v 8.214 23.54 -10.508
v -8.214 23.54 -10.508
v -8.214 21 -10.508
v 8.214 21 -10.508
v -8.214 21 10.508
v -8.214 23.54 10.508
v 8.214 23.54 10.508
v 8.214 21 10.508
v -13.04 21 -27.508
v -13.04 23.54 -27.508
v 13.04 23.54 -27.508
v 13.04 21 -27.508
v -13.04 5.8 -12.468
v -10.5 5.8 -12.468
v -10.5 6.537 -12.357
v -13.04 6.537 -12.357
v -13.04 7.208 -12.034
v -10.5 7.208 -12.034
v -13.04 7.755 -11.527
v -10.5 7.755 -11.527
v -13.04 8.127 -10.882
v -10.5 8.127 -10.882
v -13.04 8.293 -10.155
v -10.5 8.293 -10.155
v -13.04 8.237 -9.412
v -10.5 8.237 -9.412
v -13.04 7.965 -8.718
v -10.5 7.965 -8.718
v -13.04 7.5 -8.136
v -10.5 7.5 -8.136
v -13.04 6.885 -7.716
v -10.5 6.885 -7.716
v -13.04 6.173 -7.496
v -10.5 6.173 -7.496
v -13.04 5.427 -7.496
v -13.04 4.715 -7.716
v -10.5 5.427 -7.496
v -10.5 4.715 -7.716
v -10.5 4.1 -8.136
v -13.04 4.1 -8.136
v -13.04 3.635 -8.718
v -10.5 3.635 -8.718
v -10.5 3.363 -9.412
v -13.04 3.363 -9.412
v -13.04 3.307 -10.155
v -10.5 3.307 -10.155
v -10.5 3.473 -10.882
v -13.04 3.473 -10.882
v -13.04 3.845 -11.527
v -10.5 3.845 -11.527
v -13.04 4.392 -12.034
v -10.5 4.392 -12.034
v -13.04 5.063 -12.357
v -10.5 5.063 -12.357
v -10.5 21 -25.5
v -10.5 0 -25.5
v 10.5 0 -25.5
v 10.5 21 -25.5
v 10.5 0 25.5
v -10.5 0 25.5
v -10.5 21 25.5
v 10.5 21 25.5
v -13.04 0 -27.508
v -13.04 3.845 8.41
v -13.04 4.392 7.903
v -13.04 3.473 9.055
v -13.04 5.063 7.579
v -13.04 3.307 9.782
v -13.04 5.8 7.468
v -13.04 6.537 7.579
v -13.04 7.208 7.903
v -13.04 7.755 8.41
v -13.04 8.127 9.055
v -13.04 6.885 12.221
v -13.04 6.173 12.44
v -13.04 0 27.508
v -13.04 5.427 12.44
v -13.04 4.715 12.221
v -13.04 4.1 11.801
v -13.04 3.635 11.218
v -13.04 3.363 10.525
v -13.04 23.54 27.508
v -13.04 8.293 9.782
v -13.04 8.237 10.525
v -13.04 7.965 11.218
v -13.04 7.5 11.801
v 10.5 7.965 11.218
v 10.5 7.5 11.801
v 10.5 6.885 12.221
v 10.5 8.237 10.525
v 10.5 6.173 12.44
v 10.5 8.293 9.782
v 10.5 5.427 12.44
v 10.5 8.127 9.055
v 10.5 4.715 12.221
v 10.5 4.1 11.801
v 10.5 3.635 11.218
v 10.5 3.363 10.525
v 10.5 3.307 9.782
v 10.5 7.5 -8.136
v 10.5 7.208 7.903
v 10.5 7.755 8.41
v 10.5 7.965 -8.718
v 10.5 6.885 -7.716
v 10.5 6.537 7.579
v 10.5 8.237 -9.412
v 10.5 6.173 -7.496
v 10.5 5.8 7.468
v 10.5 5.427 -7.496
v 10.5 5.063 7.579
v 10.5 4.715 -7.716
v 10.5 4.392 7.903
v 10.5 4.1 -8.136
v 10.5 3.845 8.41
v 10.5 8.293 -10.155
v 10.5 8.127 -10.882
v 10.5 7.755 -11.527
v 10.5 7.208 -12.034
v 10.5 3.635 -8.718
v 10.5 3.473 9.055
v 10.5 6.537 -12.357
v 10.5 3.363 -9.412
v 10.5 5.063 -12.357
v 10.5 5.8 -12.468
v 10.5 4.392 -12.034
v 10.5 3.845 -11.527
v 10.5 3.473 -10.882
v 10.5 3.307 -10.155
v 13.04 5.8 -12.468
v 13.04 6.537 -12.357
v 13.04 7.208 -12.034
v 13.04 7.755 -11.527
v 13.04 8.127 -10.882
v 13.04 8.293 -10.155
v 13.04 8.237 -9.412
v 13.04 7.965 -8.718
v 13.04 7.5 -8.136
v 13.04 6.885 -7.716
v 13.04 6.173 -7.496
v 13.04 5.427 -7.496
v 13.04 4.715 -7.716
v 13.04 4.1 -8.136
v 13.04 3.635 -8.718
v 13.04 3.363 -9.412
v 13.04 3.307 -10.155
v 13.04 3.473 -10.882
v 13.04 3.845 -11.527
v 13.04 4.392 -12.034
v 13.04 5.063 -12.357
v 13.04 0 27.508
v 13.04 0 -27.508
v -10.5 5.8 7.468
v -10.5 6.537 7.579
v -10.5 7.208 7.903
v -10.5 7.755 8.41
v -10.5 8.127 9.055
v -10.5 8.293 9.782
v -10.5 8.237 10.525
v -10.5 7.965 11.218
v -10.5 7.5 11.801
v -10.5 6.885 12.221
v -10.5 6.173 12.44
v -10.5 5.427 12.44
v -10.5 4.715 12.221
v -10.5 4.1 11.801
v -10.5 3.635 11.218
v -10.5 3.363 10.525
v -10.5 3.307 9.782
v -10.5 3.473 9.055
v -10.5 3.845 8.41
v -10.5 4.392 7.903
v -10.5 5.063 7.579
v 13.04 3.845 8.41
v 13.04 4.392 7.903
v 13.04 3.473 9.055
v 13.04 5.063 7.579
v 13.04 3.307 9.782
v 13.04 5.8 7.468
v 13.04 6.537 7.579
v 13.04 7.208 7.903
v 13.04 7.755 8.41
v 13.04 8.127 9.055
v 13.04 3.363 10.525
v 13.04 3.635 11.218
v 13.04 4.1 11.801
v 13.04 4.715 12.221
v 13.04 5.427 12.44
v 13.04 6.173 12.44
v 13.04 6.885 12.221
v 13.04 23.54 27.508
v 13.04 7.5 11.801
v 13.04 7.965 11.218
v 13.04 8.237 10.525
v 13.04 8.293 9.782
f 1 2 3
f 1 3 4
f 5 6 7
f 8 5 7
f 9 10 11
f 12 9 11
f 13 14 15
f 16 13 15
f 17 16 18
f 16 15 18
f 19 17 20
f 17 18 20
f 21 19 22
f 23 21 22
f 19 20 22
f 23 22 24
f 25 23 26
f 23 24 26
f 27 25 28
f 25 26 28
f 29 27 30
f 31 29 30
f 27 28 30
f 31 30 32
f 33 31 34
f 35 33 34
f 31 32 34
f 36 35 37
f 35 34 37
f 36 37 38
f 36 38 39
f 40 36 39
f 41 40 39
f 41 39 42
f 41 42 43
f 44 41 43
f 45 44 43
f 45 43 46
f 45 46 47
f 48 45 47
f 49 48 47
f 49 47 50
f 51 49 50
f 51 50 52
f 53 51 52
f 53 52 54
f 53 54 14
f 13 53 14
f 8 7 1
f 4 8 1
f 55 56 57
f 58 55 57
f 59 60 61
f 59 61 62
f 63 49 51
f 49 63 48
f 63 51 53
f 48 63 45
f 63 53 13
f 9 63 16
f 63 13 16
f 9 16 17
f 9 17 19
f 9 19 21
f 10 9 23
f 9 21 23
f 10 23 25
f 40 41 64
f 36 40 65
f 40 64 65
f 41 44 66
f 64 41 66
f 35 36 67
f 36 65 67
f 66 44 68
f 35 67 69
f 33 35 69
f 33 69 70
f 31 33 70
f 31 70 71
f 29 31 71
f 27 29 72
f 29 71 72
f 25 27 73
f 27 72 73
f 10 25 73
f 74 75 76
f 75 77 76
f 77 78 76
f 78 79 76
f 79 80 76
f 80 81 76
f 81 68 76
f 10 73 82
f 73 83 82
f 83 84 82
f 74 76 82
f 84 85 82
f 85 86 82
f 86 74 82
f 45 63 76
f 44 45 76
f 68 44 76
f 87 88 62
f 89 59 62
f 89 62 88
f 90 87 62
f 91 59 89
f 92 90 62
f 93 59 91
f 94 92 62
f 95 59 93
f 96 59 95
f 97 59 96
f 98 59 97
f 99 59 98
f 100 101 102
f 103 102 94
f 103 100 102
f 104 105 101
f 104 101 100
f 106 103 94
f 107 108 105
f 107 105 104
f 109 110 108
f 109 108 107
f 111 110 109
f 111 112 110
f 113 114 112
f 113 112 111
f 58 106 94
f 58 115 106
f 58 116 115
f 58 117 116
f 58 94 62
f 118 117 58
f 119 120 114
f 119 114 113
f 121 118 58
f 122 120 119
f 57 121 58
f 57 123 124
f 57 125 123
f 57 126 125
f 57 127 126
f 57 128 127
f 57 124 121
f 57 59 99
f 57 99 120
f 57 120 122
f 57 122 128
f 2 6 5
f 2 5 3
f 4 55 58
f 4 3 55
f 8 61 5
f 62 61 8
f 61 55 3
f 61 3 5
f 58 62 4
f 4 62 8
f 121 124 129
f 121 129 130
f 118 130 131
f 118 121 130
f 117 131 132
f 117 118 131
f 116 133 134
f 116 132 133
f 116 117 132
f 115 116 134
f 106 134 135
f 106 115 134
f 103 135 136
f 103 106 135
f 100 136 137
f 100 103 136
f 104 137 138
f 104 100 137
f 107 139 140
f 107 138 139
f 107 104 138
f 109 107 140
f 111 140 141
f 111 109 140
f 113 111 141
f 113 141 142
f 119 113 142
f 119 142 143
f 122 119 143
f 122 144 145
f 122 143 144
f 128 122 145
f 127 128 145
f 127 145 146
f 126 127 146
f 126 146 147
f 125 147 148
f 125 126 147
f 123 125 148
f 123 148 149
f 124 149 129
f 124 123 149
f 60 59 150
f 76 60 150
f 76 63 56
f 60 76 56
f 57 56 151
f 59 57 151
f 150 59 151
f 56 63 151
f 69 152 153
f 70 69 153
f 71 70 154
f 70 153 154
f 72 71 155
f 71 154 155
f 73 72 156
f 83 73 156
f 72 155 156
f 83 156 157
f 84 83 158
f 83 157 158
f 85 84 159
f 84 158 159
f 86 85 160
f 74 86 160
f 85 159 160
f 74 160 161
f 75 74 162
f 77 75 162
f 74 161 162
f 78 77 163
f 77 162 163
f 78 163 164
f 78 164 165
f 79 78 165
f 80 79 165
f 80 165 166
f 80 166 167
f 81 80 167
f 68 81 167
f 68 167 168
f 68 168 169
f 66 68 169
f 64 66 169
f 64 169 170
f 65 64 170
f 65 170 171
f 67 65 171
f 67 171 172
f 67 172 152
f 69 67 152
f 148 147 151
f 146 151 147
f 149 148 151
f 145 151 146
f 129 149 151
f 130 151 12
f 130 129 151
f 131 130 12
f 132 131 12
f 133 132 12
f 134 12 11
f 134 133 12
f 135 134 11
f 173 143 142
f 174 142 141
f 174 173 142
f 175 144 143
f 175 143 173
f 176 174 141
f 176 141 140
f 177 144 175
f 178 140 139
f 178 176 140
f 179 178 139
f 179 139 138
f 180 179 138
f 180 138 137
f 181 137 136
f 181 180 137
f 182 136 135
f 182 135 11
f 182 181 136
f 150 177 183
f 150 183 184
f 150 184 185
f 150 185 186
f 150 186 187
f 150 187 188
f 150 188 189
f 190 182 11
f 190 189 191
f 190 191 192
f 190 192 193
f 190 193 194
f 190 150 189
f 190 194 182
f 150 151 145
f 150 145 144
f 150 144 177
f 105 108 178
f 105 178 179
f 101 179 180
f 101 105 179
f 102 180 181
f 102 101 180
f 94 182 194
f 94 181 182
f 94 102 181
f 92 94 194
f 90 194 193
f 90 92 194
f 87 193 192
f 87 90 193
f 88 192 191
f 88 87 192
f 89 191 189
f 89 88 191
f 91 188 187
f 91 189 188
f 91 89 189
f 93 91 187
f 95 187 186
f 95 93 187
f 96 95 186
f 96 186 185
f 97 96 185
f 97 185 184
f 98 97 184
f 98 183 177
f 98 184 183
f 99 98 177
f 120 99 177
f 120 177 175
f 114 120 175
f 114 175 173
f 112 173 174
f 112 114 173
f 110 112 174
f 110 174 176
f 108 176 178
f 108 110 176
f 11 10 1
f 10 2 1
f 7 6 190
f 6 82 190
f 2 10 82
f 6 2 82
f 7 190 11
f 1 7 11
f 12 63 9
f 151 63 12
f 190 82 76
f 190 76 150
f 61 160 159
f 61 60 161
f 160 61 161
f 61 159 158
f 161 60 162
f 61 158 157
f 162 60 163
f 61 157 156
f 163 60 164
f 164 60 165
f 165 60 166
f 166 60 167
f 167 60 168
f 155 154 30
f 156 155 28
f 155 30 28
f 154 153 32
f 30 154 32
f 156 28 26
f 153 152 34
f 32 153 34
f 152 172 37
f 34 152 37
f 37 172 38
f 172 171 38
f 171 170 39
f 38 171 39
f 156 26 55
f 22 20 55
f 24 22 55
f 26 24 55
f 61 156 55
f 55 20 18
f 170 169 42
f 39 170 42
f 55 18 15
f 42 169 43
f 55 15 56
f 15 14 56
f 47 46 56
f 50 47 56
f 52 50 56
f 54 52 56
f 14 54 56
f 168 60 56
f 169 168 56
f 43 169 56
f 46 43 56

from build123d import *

# Parameters (mm, degrees)
SKETCH1_W                      = 26.08
SKETCH1_H                      = 55.016744186
SKETCH1_W_2                    = 21
SKETCH1_H_2                    = 51
BOSS_EXTRUDE1_DEPTH            = 21
SKETCH3_W                      = 26.08
SKETCH3_H                      = 2.54
BOSS_EXTRUDE2_DEPTH            = 55.016744
CUT_EXTRUDE1_REACH             = 40.482
SKETCH4_W                      = 16.428
SKETCH4_H                      = 21.016744186
CUT_EXTRUDE2_REACH             = 40.482
SKETCH5_R                      = 2.5
CUT_EXTRUDE2_DIRECTION_2_REACH = 40.482


with BuildPart() as part:
    # Sketch1 → Boss-Extrude1 (new body)
    with BuildSketch(Plane(origin=(0, 0, 0), x_dir=(1, 0, 0), z_dir=(0, 1, 0))):
        Rectangle(SKETCH1_W, SKETCH1_H)
        Rectangle(SKETCH1_W_2, SKETCH1_H_2, mode=Mode.SUBTRACT)
    extrude(amount=BOSS_EXTRUDE1_DEPTH)

    # Sketch3 → Boss-Extrude2 (add, through all)
    with BuildSketch(Plane.XY.offset(27.508372093)):
        with Locations((0, 22.27)):
            Rectangle(SKETCH3_W, SKETCH3_H)
    extrude(amount=-BOSS_EXTRUDE2_DEPTH)

    # Sketch4 → Cut-Extrude1 (cut, up to next)
    with BuildSketch(Plane(origin=(0, 23.54, 0), x_dir=(1, 0, 0), z_dir=(0, 1, 0)), mode=Mode.PRIVATE) as cut_extrude1_sk1:
        Rectangle(SKETCH4_W, SKETCH4_H)
    cut_extrude1_tool1 = extrude(cut_extrude1_sk1.sketch, amount=-CUT_EXTRUDE1_REACH, mode=Mode.PRIVATE) & part.part
    add(cut_extrude1_tool1.solids().sort_by_distance((0, 23.54, 0))[0], mode=Mode.SUBTRACT)

    # Sketch5 → Cut-Extrude2 (cut, up to next)
    with BuildSketch(Plane(origin=(0, 0, 0), x_dir=(0, 0, -1), z_dir=(1, 0, 0)), mode=Mode.PRIVATE) as cut_extrude2_sk1:
        with Locations((-9.968372093, 5.8)):
            Circle(SKETCH5_R)
    cut_extrude2_tool1 = extrude(cut_extrude2_sk1.sketch, amount=-CUT_EXTRUDE2_REACH, mode=Mode.PRIVATE) & part.part
    # Sketch5 → Cut-Extrude2 (cut, up to next)
    with BuildSketch(Plane(origin=(0, 0, 0), x_dir=(0, 0, -1), z_dir=(1, 0, 0)), mode=Mode.PRIVATE) as cut_extrude2_sk2:
        with Locations((9.968372093, 5.8)):
            Circle(SKETCH5_R)
    cut_extrude2_tool2 = extrude(cut_extrude2_sk2.sketch, amount=-CUT_EXTRUDE2_REACH, mode=Mode.PRIVATE) & part.part
    add(cut_extrude2_tool1.solids().sort_by_distance((0, 5.8, 9.968372))[0], mode=Mode.SUBTRACT)
    add(cut_extrude2_tool2.solids().sort_by_distance((0, 5.8, -9.968372))[0], mode=Mode.SUBTRACT)

    # Sketch5 → Cut-Extrude2 direction 2 (cut, up to next)
    with BuildSketch(Plane(origin=(0, 0, 0), x_dir=(0, 0, -1), z_dir=(1, 0, 0)), mode=Mode.PRIVATE) as cut_extrude2_direction_2_sk1:
        with Locations((-9.968372093, 5.8)):
            Circle(SKETCH5_R)
    cut_extrude2_direction_2_tool1 = extrude(cut_extrude2_direction_2_sk1.sketch, amount=CUT_EXTRUDE2_DIRECTION_2_REACH, mode=Mode.PRIVATE) & part.part
    # Sketch5 → Cut-Extrude2 direction 2 (cut, up to next)
    with BuildSketch(Plane(origin=(0, 0, 0), x_dir=(0, 0, -1), z_dir=(1, 0, 0)), mode=Mode.PRIVATE) as cut_extrude2_direction_2_sk2:
        with Locations((9.968372093, 5.8)):
            Circle(SKETCH5_R)
    cut_extrude2_direction_2_tool2 = extrude(cut_extrude2_direction_2_sk2.sketch, amount=CUT_EXTRUDE2_DIRECTION_2_REACH, mode=Mode.PRIVATE) & part.part
    add(cut_extrude2_direction_2_tool1.solids().sort_by_distance((0, 5.8, 9.968372))[0], mode=Mode.SUBTRACT)
    add(cut_extrude2_direction_2_tool2.solids().sort_by_distance((0, 5.8, -9.968372))[0], mode=Mode.SUBTRACT)


solid = part.part
